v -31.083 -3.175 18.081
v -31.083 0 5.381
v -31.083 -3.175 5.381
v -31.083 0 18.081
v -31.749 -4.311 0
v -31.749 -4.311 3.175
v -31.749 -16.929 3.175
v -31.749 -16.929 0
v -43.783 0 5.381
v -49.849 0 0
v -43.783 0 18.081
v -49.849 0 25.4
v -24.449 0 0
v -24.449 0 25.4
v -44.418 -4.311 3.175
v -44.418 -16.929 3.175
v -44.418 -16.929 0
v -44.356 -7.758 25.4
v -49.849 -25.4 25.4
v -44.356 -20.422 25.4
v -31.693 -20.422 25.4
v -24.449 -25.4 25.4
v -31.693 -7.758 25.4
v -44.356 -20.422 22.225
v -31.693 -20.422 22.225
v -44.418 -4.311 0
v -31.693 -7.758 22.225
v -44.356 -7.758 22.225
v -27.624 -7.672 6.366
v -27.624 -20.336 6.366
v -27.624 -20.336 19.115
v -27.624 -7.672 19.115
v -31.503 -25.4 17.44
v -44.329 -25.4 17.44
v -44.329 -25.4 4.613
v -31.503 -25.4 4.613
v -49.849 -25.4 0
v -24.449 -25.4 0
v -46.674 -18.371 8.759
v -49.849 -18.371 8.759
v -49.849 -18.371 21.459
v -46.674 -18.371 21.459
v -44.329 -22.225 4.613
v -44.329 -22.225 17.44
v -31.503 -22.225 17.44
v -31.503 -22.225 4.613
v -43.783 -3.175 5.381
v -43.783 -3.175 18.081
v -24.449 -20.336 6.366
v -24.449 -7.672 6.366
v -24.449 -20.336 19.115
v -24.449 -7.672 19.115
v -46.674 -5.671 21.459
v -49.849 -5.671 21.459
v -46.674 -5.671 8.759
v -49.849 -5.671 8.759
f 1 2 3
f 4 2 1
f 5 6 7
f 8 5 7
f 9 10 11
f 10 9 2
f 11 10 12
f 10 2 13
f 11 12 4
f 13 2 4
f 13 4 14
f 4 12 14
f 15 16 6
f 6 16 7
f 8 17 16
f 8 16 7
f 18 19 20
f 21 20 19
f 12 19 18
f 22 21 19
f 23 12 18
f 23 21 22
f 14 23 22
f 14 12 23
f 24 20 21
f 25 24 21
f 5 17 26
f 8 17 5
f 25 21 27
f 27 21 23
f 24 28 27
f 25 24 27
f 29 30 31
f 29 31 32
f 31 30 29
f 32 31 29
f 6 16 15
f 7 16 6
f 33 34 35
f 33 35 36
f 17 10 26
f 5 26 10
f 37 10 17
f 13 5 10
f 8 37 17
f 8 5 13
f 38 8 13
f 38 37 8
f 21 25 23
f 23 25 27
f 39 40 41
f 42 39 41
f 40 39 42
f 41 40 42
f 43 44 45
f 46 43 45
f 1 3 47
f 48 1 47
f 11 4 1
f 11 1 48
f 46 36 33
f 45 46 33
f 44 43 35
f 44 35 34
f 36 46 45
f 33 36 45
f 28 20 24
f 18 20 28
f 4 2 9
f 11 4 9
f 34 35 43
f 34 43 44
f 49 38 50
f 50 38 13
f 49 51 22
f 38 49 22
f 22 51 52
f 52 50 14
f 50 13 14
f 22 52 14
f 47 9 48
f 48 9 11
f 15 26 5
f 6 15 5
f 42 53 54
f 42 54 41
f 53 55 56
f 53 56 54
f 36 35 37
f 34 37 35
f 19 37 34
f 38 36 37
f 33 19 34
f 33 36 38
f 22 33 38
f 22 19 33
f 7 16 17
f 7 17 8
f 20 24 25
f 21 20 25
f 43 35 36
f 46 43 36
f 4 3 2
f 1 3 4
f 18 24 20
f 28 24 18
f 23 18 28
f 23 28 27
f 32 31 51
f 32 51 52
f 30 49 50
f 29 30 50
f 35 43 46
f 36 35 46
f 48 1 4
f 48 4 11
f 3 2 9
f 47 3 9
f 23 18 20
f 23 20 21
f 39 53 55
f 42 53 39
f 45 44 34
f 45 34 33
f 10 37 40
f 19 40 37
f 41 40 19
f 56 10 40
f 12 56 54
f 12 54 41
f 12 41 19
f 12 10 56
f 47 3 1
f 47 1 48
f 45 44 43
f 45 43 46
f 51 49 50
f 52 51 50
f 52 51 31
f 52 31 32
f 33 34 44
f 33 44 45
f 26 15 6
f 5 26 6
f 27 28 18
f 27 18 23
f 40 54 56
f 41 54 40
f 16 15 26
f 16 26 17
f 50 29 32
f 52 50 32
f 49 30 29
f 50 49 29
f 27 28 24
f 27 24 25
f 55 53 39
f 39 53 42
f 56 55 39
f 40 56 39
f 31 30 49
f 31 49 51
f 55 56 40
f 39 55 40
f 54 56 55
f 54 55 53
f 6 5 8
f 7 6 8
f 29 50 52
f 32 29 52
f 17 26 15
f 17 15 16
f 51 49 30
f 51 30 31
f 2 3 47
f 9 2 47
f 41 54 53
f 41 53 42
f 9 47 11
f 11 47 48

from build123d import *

# Parameters (mm, degrees)
F0_W      = 25.4
F0_H      = 25.4
F1_DEPTH  = 25.4
F2_W      = 12.7
F2_H      = 12.7
F3_DEPTH  = 3.175
F4_W      = 12.7
F4_H      = 12.7
F5_DEPTH  = 3.175
F6_W      = 12.7
F6_H      = 12.7
F7_DEPTH  = 3.175
F8_W      = 12.7
F8_H      = 12.7
F9_DEPTH  = 3.175
F10_W     = 12.7
F10_H     = 12.7
F11_DEPTH = 3.175
F12_W     = 12.7
F12_H     = 12.7
F13_DEPTH = 3.175
F15_W     = 12.7
F15_H     = 12.7
F16_DEPTH = 3.175
F17_W     = 12.6634519547
F17_H     = 12.7354045399
F18_DEPTH = 3.175
F19_DEPTH = 3.175
F20_W     = 12.6684606075
F20_H     = 12.6175838523
F21_DEPTH = 3.175
F22_W     = 12.6684606075
F22_H     = 12.6175838523
F23_DEPTH = 3.175
F24_W     = 12.6636438072
F24_H     = 12.6636438072
F25_DEPTH = 3.175
F26_W     = 12.6636447385
F26_H     = 12.7492104657
F27_DEPTH = 3.175
F28_W     = 12.8267854452
F28_H     = 12.8267859109
F29_DEPTH = 3.175
F30_W     = 12.6636447385
F30_H     = 12.7492104657
F31_DEPTH = 3.175
F32_W     = 12.8267854452
F32_H     = 12.8267859109
F33_DEPTH = 3.175
F34_W     = 12.6636438072
F34_H     = 12.6636438072
F35_DEPTH = 3.175


with BuildPart() as f1:
    # F0 (on Front) → F1 (new body)
    with BuildSketch(Plane.XZ):
        with Locations((-37.148510812, 12.7)):
            Rectangle(F0_W, F0_H)
    extrude(amount=F1_DEPTH)

    # F2 (on face) → F3 (cut)
    with BuildSketch(Plane.XZ.offset(25.4)):
        with Locations((-36.6952344775, 11.9878393746)):
            Rectangle(F2_W, F2_H)
    extrude(amount=-F3_DEPTH, mode=Mode.SUBTRACT)

    # F4 (on face) → F5 (cut)
    with BuildSketch(Plane(origin=(-49.848510812, 0, 0), x_dir=(0, -1, 0), z_dir=(-1, 0, 0))):
        with Locations((12.02116278, 15.1086977403)):
            Rectangle(F4_W, F4_H)
    extrude(amount=-F5_DEPTH, mode=Mode.SUBTRACT)

    # F6 (on face) → F7 (cut)
    with BuildSketch(Plane(origin=(0, 0, 0), x_dir=(-1, 0, 0), z_dir=(0, 1, 0))):
        with Locations((37.432719022, 11.7305689754)):
            Rectangle(F6_W, F6_H)
    extrude(amount=-F7_DEPTH, mode=Mode.SUBTRACT)

    # F10 (on face) → F11 (join)
    with BuildSketch(Plane.XZ.offset(22.225)):
        with Locations((-36.6952344775, 11.9878393746)):
            Rectangle(F10_W, F10_H)
    extrude(amount=F11_DEPTH)

    # F17 (on face) → F18 (cut)
    with BuildSketch(Plane(origin=(0, 0, 0), x_dir=(1, 0, 0), z_dir=(0, 0, -1))):
        with Locations((-37.2643144801, 11.3814079668)):
            Rectangle(F17_W, F17_H)
    extrude(amount=-F18_DEPTH, mode=Mode.SUBTRACT)

    # F19 (add): a face of the model
    f19_faces = [f1.faces().sort_by_distance(p)[0] for p in [
        (-37.2643144801, -11.3814079668, 3.175),
    ]]
    extrude(f19_faces, amount=F19_DEPTH)

    # F20 (on face) → F21 (cut)
    with BuildSketch(Plane(origin=(0, 0, 0), x_dir=(1, 0, 0), z_dir=(0, 0, -1))):
        with Locations((-38.0833484232, 10.6200820301)):
            Rectangle(F20_W, F20_H)
    extrude(amount=-F21_DEPTH, mode=Mode.SUBTRACT)

    # F24 (on face) → F25 (cut)
    with BuildSketch(Plane.XY.offset(25.4)):
        with Locations((-38.0246657878, -14.0896886587)):
            Rectangle(F24_W, F24_H)
    extrude(amount=-F25_DEPTH, mode=Mode.SUBTRACT)

    # F26 (on face) → F27 (cut)
    with BuildSketch(Plane.YZ.offset(-24.448510812)):
        with Locations((-14.0041238628, 12.7401610371)):
            Rectangle(F26_W, F26_H)
    extrude(amount=-F27_DEPTH, mode=Mode.SUBTRACT)

    # F28 (on face) → F29 (cut)
    with BuildSketch(Plane.XZ.offset(25.4)):
        with Locations((-37.9159785807, 11.0263393726)):
            Rectangle(F28_W, F28_H)
    extrude(amount=-F29_DEPTH, mode=Mode.SUBTRACT)


with BuildPart() as f9:
    # F8 (on face) → F9 (new body)
    with BuildSketch(Plane(origin=(0, -3.175, 0), x_dir=(-1, 0, 0), z_dir=(0, 1, 0))):
        with Locations((37.432719022, 11.7305689754)):
            Rectangle(F8_W, F8_H)
    extrude(amount=F9_DEPTH)


with BuildPart() as f13:
    # F12 (on face) → F13 (new body)
    with BuildSketch(Plane(origin=(-49.848510812, 0, 0), x_dir=(0, -1, 0), z_dir=(-1, 0, 0))):
        with Locations((12.02116278, 15.1086977403)):
            Rectangle(F12_W, F12_H)
    extrude(amount=F13_DEPTH)


with BuildPart() as f16:
    # F15 (on face) → F16 (new body)
    with BuildSketch(Plane(origin=(-46.673510812, 0, 0), x_dir=(0, -1, 0), z_dir=(-1, 0, 0))):
        with Locations((12.02116278, 15.1086977403)):
            Rectangle(F15_W, F15_H)
    extrude(amount=F16_DEPTH)


with BuildPart() as f23:
    # F22 (on face) → F23 (new body)
    with BuildSketch(Plane(origin=(0, 0, 3.175), x_dir=(1, 0, 0), z_dir=(0, 0, -1))):
        with Locations((-38.0833484232, 10.6200820301)):
            Rectangle(F22_W, F22_H)
    extrude(amount=F23_DEPTH)


with BuildPart() as f31:
    # F30 (on face) → F31 (new body)
    with BuildSketch(Plane.YZ.offset(-27.623510812)):
        with Locations((-14.0041238628, 12.7401610371)):
            Rectangle(F30_W, F30_H)
    extrude(amount=F31_DEPTH)


with BuildPart() as f33:
    # F32 (on face) → F33 (new body)
    with BuildSketch(Plane.XZ.offset(22.225)):
        with Locations((-37.9159785807, 11.0263393726)):
            Rectangle(F32_W, F32_H)
    extrude(amount=F33_DEPTH)


with BuildPart() as f35:
    # F34 (on face) → F35 (new body)
    with BuildSketch(Plane.XY.offset(22.225)):
        with Locations((-38.0246657878, -14.0896886587)):
            Rectangle(F34_W, F34_H)
    extrude(amount=F35_DEPTH)


solid = Compound([f1.part, f9.part, f16.part, f23.part, f31.part, f33.part, f35.part])
